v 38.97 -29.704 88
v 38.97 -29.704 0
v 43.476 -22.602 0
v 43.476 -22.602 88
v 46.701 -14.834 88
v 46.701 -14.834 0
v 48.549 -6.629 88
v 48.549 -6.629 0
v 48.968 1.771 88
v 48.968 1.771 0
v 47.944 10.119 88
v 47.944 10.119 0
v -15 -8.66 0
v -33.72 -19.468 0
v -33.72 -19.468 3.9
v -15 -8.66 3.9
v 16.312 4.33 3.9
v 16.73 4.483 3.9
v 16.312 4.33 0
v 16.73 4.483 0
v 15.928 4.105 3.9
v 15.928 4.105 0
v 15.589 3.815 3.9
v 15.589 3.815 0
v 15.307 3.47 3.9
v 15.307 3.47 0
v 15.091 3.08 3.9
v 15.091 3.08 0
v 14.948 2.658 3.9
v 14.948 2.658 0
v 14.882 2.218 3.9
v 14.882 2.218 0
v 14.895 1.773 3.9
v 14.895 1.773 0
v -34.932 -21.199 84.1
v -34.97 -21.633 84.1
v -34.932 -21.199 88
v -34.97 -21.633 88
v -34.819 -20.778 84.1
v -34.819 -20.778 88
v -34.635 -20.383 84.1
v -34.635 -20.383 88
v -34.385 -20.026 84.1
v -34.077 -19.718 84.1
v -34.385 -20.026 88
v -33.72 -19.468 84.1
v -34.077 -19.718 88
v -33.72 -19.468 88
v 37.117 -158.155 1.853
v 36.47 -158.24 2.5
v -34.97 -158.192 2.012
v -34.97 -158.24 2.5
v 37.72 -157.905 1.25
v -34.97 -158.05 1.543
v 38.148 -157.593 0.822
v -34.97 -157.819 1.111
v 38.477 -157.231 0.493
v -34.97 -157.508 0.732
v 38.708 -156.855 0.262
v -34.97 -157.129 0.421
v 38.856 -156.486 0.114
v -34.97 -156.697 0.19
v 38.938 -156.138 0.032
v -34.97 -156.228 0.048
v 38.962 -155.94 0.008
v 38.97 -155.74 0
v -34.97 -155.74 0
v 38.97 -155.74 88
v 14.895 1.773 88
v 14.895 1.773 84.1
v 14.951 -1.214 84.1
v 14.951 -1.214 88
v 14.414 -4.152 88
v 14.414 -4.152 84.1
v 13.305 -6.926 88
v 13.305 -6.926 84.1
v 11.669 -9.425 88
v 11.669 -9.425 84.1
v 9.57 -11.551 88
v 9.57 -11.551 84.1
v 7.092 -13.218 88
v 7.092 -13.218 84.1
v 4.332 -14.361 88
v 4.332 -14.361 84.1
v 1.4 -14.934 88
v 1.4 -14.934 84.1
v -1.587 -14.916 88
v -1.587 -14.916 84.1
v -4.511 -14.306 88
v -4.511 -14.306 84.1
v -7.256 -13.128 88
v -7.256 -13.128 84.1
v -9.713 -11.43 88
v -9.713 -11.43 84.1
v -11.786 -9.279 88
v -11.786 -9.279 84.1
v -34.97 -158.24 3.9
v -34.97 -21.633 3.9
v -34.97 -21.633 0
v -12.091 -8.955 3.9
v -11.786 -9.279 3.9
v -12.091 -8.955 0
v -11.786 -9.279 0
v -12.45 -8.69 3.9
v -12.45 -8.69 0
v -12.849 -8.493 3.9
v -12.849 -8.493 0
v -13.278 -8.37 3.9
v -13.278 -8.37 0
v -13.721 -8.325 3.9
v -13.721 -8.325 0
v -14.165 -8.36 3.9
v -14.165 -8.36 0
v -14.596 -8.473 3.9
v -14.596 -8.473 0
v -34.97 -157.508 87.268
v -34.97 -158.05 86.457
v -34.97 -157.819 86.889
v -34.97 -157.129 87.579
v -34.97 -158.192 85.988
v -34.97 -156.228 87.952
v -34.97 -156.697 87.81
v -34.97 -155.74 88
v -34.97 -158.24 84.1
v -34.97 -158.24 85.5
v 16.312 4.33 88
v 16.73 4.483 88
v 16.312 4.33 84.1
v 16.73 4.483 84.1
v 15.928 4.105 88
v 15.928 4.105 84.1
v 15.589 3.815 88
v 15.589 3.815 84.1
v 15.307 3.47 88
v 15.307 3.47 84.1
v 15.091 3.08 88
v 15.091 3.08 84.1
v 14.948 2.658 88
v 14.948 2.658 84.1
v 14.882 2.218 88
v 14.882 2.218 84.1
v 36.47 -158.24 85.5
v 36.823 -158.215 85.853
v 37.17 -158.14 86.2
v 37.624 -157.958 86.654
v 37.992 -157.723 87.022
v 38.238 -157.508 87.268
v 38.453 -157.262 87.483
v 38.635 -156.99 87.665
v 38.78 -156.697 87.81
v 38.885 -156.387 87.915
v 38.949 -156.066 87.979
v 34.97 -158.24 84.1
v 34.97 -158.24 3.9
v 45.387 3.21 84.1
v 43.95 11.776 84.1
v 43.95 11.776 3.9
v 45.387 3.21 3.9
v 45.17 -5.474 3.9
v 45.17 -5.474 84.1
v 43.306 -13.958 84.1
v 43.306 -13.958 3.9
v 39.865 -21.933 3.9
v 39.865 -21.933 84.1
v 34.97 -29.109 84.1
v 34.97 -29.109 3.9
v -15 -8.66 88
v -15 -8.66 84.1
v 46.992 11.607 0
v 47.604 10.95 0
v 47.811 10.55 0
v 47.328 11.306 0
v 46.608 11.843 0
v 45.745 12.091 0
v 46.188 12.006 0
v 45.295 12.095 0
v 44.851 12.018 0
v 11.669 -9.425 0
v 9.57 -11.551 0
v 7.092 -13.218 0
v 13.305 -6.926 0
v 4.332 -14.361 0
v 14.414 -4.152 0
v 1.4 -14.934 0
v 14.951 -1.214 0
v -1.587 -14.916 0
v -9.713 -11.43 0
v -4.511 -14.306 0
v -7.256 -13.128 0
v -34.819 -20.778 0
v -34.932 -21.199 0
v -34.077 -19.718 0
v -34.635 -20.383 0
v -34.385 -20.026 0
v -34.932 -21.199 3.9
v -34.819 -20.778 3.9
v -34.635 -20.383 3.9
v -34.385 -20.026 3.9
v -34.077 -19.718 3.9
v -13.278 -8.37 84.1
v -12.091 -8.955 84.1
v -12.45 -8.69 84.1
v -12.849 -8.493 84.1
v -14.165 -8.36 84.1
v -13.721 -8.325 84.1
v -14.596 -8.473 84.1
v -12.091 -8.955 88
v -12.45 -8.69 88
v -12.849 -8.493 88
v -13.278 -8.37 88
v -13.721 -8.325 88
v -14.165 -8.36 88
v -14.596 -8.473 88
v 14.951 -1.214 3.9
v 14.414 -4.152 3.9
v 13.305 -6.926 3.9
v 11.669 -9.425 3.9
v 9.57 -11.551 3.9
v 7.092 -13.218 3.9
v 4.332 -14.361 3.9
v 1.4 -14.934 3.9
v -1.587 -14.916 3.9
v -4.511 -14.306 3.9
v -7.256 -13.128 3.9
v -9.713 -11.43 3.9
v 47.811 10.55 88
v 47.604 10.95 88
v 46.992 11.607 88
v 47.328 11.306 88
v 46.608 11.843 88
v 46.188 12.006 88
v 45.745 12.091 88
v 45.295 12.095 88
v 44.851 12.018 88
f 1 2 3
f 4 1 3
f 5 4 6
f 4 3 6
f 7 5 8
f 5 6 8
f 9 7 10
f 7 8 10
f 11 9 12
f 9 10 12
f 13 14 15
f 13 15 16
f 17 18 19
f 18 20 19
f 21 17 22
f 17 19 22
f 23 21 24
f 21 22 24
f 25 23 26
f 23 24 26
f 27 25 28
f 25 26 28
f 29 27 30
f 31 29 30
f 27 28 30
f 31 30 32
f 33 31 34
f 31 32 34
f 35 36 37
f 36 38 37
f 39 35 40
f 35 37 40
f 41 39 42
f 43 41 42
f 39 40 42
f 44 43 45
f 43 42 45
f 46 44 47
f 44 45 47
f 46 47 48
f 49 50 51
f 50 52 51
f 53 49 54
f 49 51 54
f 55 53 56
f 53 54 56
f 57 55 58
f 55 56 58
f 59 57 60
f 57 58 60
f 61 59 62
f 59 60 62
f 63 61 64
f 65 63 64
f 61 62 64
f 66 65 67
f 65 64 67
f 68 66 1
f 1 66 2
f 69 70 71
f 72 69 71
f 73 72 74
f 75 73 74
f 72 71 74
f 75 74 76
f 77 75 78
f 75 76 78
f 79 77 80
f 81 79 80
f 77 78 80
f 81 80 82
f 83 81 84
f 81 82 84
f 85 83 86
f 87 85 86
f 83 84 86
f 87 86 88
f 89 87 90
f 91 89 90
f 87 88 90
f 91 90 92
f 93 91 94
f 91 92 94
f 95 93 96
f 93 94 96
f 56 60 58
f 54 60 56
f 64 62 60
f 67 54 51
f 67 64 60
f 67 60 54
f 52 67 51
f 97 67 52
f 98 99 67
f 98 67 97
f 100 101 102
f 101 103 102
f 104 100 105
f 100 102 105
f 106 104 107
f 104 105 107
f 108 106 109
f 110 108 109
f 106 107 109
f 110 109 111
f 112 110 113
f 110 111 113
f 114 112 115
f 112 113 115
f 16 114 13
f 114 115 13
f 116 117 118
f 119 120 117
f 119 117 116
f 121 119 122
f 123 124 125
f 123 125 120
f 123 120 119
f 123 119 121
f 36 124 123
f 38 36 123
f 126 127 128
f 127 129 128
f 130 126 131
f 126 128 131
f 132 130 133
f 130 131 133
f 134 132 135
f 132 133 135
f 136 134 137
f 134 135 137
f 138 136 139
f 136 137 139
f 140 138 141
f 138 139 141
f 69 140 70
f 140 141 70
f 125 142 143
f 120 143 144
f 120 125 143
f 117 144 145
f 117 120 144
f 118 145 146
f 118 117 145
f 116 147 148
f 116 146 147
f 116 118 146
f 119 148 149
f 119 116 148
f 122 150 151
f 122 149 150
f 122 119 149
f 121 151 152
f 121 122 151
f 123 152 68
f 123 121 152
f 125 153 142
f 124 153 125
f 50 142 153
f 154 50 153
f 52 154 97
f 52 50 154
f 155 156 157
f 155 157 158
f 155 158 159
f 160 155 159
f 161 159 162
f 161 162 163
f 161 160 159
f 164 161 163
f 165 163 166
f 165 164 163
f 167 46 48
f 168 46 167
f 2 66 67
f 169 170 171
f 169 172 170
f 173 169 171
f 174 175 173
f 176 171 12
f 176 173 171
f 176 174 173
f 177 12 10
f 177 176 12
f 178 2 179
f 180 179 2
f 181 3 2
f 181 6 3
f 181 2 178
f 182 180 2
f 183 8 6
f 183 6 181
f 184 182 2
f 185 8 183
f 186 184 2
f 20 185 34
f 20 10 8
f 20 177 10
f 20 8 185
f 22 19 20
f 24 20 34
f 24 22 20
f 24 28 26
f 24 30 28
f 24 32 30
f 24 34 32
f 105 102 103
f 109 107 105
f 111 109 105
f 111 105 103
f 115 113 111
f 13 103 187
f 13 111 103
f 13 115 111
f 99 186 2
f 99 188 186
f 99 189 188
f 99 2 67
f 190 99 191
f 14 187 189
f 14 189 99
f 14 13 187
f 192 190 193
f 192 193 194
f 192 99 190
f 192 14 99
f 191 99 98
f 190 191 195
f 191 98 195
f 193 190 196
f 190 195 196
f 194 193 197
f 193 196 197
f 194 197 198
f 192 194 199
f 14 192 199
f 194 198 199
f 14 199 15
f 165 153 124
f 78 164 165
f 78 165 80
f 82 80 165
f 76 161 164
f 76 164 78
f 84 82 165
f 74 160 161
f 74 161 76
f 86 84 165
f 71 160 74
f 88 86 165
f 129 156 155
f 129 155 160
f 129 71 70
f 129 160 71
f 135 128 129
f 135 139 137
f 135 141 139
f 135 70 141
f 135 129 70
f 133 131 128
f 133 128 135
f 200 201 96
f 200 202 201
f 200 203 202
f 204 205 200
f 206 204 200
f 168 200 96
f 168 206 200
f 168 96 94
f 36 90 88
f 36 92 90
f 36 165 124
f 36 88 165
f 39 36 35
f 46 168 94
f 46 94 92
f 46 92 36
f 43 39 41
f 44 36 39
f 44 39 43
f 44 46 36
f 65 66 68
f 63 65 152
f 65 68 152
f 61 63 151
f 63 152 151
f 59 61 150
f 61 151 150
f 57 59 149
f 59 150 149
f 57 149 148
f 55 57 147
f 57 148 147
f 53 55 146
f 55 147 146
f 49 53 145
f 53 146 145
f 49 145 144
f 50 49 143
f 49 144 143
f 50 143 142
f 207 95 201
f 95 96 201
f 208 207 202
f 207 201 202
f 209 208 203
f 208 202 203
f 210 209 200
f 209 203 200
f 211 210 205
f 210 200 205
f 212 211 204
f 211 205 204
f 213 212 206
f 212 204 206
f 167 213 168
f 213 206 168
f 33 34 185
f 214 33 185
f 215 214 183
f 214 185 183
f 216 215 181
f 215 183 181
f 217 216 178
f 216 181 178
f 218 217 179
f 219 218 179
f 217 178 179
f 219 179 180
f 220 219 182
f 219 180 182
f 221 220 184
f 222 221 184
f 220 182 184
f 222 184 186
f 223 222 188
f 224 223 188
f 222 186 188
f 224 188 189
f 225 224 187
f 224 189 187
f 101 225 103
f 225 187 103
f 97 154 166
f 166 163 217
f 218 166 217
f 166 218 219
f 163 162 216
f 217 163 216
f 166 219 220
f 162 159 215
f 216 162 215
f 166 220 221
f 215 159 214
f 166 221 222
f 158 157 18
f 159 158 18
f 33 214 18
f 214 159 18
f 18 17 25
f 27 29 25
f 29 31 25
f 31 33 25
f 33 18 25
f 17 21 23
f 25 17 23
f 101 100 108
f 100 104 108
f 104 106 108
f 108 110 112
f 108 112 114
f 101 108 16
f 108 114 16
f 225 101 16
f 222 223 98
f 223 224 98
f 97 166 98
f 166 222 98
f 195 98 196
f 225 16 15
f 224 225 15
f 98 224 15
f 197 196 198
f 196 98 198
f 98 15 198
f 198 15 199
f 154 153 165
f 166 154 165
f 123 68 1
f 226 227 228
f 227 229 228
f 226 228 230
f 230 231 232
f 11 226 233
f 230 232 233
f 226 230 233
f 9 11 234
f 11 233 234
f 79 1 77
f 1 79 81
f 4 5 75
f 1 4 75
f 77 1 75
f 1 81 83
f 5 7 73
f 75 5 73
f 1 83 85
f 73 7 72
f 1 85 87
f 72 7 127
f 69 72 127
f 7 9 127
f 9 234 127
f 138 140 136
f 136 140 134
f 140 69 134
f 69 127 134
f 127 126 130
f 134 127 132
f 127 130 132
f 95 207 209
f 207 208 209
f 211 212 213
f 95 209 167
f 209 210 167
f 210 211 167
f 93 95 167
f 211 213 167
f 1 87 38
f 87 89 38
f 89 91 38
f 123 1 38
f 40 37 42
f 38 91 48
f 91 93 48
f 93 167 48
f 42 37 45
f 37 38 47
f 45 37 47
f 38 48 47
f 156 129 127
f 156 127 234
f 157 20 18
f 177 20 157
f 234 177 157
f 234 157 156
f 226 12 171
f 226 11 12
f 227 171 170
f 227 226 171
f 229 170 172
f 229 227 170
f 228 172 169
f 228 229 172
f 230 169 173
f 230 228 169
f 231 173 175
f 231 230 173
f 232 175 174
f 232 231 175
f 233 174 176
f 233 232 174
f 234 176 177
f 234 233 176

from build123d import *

# Parameters (mm, degrees)
SKETCH1_R               = 49
BOSS_EXTRUDE1_DEPTH     = 88
CUT_EXTRUDE1_DEPTH      = 88
SKETCH3_W               = 77.94
SKETCH3_H               = 128.535806693
BOSS_EXTRUDE2_DEPTH     = 88
CUT_EXTRUDE2_DEPTH      = 40.1
CUT_EXTRUDE2_DEPTH_BACK = 40.1
SKETCH4_R               = 45.5
CUT_EXTRUDE3_DEPTH      = 40.1
CUT_EXTRUDE3_DEPTH_BACK = 40.1
SKETCH5_W               = 69.94
SKETCH5_H               = 158.24
CUT_EXTRUDE5_DEPTH      = 202.302306246
CUT_EXTRUDE5_DEPTH_BACK = 4
SKETCH6_W               = 88
SKETCH6_H               = 170.045451323
SKETCH7_R               = 15
CUT_EXTRUDE6_DEPTH      = 188.576378044
FILLET1_R               = 2.5


with BuildPart() as part:
    # Sketch1 → Boss-Extrude1 (new body)
    with BuildSketch(Plane.XY):
        Circle(SKETCH1_R)
    extrude(amount=BOSS_EXTRUDE1_DEPTH)

    # Sketch2 → Cut-Extrude1 (cut)
    with BuildSketch(Plane(origin=(0, 0, 0), x_dir=(-1, 0, 0), z_dir=(0, 0, -1))):
        with BuildLine():
            Line((0, 0), (-47.330365488, 12.68213321))
            ThreePointArc((-47.330365488, 12.68213321), (18.751488186, 45.270097093), (42.435244785, -24.5))
            Line((42.435244785, -24.5), (0, 0))
        make_face()
    extrude(amount=-CUT_EXTRUDE1_DEPTH, mode=Mode.SUBTRACT)

    # Sketch3 → Boss-Extrude2 (add)
    with BuildSketch(Plane(origin=(0, 0, 0), x_dir=(-1, 0, 0), z_dir=(0, 0, -1))):
        with Locations((0, -93.972096654)):
            Rectangle(SKETCH3_W, SKETCH3_H)
    extrude(amount=-BOSS_EXTRUDE2_DEPTH)

    # Sketch4 → Cut-Extrude2 (cut, two sides: drawn at the far end of the back side and taken through both)
    with BuildSketch(Plane(origin=(0, 0, 44), x_dir=(-1, 0, 0), z_dir=(0, 0, -1)).offset(-CUT_EXTRUDE2_DEPTH_BACK)):
        Circle(SKETCH4_R)
    extrude(amount=CUT_EXTRUDE2_DEPTH + CUT_EXTRUDE2_DEPTH_BACK, mode=Mode.SUBTRACT)

    # Sketch5 → Cut-Extrude3 (cut, two sides: drawn at the far end of the back side and taken through both)
    with BuildSketch(Plane(origin=(0, 0, 44), x_dir=(-1, 0, 0), z_dir=(0, 0, -1)).offset(-CUT_EXTRUDE3_DEPTH_BACK)):
        with Locations((0, -79.12)):
            Rectangle(SKETCH5_W, SKETCH5_H)
    extrude(amount=CUT_EXTRUDE3_DEPTH + CUT_EXTRUDE3_DEPTH_BACK, mode=Mode.SUBTRACT)

    # Sketch6 → Cut-Extrude5 (cut, two sides: drawn at the far end of the back side and taken through both)
    with BuildSketch(Plane.ZY.offset(38.97).offset(-CUT_EXTRUDE5_DEPTH_BACK)):
        with Locations((44, -73.246459109)):
            Rectangle(SKETCH6_W, SKETCH6_H)
    extrude(amount=CUT_EXTRUDE5_DEPTH + CUT_EXTRUDE5_DEPTH_BACK, mode=Mode.SUBTRACT)

    # Sketch7 → Cut-Extrude6 (cut, through all)
    with BuildSketch(Plane(origin=(0, 0, 0), x_dir=(-1, 0, 0), z_dir=(0, 0, -1))):
        Circle(SKETCH7_R)
    extrude(amount=-CUT_EXTRUDE6_DEPTH, mode=Mode.SUBTRACT)

    # Fillet1
    fillet1_edges = [part.edges().sort_by_distance(p)[0] for p in [
        (47.330365488, 12.68213321, 44),
        (14.488887394, 3.882285677, 86.05),
        (14.488887394, 3.882285677, 1.95),
        (-12.990381057, -7.5, 1.95),
        (-12.990381057, -7.5, 86.05),
        (2, -158.24, 0),
        (38.97, -158.24, 44),
        (2, -158.24, 88),
        (-34.97, -20.189938914, 1.95),
        (-34.97, -20.189938914, 86.05),
    ]]
    fillet(fillet1_edges, radius=FILLET1_R)


solid = part.part
